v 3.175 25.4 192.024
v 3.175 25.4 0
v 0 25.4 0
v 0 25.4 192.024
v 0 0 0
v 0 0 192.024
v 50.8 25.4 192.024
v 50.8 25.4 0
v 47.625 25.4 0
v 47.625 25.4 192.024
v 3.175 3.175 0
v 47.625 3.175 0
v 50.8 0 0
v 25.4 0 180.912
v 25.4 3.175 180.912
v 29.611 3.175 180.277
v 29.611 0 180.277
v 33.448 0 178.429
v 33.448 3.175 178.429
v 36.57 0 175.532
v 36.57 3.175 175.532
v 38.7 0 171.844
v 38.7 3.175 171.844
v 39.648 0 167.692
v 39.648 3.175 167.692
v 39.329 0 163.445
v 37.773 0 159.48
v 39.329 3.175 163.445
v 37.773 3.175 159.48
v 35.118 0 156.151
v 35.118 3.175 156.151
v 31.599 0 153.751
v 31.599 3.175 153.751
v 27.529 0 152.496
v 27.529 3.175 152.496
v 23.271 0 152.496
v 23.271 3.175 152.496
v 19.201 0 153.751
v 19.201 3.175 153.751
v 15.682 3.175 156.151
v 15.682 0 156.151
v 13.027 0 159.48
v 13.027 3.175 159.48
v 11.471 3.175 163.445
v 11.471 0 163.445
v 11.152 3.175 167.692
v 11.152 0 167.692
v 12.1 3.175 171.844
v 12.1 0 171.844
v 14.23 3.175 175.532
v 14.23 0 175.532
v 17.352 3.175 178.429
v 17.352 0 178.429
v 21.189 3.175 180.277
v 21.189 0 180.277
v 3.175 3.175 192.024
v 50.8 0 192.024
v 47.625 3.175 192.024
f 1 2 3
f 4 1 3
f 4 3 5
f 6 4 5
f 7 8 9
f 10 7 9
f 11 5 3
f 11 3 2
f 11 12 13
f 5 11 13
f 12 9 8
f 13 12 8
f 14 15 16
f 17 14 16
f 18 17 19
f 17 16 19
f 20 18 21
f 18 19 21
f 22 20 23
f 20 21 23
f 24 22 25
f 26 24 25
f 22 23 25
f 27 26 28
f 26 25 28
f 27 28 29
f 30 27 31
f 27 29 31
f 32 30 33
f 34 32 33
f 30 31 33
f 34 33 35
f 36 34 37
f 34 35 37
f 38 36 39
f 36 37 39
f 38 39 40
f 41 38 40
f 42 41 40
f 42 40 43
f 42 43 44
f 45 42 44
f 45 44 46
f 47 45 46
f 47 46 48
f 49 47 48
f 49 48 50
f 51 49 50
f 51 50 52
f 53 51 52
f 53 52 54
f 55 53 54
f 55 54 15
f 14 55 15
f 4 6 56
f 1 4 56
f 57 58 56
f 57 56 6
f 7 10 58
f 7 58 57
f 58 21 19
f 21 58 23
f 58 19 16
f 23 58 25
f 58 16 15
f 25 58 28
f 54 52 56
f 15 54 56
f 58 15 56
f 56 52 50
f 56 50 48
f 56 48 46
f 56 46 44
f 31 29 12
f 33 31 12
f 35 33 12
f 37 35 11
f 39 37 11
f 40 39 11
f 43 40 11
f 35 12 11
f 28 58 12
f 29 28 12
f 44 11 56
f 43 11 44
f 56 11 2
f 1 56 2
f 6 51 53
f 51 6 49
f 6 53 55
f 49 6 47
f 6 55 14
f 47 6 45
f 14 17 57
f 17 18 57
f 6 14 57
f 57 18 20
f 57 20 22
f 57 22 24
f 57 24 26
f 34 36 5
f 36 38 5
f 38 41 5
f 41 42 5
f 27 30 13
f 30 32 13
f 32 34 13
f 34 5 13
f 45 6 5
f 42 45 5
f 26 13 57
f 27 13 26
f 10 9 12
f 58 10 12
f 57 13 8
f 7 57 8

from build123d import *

# Parameters (mm, degrees)
EXTRUDE_F_DEPTH    = 192.024
CUT_EXTRUDE1_REACH = 201.869
SKETCH2_R          = 14.2875


with BuildPart() as part:
    # Sketch1 → Extrude f (new body)
    with BuildSketch(Plane.XY):
        Polygon((3.175, 3.175), (3.175, 25.4), (0, 25.4), (0, 0), (50.8, 0), (50.8, 25.4), (47.625, 25.4), (47.625, 3.175), align=None)
    extrude(amount=EXTRUDE_F_DEPTH)

    # Sketch2 → Cut-Extrude1 (cut, up to next)
    with BuildSketch(Plane(origin=(0, 3.175, 0), x_dir=(1, 0, 0), z_dir=(0, 1, 0)), mode=Mode.PRIVATE) as cut_extrude1_sk1:
        with Locations(Location((25.4, -166.624, 0), (0, 0, 270))):
            Circle(SKETCH2_R)
    cut_extrude1_tool1 = extrude(cut_extrude1_sk1.sketch, amount=-CUT_EXTRUDE1_REACH, mode=Mode.PRIVATE) & part.part
    add(cut_extrude1_tool1.solids().sort_by_distance((25.4, 3.175, 166.624))[0], mode=Mode.SUBTRACT)


solid = part.part
